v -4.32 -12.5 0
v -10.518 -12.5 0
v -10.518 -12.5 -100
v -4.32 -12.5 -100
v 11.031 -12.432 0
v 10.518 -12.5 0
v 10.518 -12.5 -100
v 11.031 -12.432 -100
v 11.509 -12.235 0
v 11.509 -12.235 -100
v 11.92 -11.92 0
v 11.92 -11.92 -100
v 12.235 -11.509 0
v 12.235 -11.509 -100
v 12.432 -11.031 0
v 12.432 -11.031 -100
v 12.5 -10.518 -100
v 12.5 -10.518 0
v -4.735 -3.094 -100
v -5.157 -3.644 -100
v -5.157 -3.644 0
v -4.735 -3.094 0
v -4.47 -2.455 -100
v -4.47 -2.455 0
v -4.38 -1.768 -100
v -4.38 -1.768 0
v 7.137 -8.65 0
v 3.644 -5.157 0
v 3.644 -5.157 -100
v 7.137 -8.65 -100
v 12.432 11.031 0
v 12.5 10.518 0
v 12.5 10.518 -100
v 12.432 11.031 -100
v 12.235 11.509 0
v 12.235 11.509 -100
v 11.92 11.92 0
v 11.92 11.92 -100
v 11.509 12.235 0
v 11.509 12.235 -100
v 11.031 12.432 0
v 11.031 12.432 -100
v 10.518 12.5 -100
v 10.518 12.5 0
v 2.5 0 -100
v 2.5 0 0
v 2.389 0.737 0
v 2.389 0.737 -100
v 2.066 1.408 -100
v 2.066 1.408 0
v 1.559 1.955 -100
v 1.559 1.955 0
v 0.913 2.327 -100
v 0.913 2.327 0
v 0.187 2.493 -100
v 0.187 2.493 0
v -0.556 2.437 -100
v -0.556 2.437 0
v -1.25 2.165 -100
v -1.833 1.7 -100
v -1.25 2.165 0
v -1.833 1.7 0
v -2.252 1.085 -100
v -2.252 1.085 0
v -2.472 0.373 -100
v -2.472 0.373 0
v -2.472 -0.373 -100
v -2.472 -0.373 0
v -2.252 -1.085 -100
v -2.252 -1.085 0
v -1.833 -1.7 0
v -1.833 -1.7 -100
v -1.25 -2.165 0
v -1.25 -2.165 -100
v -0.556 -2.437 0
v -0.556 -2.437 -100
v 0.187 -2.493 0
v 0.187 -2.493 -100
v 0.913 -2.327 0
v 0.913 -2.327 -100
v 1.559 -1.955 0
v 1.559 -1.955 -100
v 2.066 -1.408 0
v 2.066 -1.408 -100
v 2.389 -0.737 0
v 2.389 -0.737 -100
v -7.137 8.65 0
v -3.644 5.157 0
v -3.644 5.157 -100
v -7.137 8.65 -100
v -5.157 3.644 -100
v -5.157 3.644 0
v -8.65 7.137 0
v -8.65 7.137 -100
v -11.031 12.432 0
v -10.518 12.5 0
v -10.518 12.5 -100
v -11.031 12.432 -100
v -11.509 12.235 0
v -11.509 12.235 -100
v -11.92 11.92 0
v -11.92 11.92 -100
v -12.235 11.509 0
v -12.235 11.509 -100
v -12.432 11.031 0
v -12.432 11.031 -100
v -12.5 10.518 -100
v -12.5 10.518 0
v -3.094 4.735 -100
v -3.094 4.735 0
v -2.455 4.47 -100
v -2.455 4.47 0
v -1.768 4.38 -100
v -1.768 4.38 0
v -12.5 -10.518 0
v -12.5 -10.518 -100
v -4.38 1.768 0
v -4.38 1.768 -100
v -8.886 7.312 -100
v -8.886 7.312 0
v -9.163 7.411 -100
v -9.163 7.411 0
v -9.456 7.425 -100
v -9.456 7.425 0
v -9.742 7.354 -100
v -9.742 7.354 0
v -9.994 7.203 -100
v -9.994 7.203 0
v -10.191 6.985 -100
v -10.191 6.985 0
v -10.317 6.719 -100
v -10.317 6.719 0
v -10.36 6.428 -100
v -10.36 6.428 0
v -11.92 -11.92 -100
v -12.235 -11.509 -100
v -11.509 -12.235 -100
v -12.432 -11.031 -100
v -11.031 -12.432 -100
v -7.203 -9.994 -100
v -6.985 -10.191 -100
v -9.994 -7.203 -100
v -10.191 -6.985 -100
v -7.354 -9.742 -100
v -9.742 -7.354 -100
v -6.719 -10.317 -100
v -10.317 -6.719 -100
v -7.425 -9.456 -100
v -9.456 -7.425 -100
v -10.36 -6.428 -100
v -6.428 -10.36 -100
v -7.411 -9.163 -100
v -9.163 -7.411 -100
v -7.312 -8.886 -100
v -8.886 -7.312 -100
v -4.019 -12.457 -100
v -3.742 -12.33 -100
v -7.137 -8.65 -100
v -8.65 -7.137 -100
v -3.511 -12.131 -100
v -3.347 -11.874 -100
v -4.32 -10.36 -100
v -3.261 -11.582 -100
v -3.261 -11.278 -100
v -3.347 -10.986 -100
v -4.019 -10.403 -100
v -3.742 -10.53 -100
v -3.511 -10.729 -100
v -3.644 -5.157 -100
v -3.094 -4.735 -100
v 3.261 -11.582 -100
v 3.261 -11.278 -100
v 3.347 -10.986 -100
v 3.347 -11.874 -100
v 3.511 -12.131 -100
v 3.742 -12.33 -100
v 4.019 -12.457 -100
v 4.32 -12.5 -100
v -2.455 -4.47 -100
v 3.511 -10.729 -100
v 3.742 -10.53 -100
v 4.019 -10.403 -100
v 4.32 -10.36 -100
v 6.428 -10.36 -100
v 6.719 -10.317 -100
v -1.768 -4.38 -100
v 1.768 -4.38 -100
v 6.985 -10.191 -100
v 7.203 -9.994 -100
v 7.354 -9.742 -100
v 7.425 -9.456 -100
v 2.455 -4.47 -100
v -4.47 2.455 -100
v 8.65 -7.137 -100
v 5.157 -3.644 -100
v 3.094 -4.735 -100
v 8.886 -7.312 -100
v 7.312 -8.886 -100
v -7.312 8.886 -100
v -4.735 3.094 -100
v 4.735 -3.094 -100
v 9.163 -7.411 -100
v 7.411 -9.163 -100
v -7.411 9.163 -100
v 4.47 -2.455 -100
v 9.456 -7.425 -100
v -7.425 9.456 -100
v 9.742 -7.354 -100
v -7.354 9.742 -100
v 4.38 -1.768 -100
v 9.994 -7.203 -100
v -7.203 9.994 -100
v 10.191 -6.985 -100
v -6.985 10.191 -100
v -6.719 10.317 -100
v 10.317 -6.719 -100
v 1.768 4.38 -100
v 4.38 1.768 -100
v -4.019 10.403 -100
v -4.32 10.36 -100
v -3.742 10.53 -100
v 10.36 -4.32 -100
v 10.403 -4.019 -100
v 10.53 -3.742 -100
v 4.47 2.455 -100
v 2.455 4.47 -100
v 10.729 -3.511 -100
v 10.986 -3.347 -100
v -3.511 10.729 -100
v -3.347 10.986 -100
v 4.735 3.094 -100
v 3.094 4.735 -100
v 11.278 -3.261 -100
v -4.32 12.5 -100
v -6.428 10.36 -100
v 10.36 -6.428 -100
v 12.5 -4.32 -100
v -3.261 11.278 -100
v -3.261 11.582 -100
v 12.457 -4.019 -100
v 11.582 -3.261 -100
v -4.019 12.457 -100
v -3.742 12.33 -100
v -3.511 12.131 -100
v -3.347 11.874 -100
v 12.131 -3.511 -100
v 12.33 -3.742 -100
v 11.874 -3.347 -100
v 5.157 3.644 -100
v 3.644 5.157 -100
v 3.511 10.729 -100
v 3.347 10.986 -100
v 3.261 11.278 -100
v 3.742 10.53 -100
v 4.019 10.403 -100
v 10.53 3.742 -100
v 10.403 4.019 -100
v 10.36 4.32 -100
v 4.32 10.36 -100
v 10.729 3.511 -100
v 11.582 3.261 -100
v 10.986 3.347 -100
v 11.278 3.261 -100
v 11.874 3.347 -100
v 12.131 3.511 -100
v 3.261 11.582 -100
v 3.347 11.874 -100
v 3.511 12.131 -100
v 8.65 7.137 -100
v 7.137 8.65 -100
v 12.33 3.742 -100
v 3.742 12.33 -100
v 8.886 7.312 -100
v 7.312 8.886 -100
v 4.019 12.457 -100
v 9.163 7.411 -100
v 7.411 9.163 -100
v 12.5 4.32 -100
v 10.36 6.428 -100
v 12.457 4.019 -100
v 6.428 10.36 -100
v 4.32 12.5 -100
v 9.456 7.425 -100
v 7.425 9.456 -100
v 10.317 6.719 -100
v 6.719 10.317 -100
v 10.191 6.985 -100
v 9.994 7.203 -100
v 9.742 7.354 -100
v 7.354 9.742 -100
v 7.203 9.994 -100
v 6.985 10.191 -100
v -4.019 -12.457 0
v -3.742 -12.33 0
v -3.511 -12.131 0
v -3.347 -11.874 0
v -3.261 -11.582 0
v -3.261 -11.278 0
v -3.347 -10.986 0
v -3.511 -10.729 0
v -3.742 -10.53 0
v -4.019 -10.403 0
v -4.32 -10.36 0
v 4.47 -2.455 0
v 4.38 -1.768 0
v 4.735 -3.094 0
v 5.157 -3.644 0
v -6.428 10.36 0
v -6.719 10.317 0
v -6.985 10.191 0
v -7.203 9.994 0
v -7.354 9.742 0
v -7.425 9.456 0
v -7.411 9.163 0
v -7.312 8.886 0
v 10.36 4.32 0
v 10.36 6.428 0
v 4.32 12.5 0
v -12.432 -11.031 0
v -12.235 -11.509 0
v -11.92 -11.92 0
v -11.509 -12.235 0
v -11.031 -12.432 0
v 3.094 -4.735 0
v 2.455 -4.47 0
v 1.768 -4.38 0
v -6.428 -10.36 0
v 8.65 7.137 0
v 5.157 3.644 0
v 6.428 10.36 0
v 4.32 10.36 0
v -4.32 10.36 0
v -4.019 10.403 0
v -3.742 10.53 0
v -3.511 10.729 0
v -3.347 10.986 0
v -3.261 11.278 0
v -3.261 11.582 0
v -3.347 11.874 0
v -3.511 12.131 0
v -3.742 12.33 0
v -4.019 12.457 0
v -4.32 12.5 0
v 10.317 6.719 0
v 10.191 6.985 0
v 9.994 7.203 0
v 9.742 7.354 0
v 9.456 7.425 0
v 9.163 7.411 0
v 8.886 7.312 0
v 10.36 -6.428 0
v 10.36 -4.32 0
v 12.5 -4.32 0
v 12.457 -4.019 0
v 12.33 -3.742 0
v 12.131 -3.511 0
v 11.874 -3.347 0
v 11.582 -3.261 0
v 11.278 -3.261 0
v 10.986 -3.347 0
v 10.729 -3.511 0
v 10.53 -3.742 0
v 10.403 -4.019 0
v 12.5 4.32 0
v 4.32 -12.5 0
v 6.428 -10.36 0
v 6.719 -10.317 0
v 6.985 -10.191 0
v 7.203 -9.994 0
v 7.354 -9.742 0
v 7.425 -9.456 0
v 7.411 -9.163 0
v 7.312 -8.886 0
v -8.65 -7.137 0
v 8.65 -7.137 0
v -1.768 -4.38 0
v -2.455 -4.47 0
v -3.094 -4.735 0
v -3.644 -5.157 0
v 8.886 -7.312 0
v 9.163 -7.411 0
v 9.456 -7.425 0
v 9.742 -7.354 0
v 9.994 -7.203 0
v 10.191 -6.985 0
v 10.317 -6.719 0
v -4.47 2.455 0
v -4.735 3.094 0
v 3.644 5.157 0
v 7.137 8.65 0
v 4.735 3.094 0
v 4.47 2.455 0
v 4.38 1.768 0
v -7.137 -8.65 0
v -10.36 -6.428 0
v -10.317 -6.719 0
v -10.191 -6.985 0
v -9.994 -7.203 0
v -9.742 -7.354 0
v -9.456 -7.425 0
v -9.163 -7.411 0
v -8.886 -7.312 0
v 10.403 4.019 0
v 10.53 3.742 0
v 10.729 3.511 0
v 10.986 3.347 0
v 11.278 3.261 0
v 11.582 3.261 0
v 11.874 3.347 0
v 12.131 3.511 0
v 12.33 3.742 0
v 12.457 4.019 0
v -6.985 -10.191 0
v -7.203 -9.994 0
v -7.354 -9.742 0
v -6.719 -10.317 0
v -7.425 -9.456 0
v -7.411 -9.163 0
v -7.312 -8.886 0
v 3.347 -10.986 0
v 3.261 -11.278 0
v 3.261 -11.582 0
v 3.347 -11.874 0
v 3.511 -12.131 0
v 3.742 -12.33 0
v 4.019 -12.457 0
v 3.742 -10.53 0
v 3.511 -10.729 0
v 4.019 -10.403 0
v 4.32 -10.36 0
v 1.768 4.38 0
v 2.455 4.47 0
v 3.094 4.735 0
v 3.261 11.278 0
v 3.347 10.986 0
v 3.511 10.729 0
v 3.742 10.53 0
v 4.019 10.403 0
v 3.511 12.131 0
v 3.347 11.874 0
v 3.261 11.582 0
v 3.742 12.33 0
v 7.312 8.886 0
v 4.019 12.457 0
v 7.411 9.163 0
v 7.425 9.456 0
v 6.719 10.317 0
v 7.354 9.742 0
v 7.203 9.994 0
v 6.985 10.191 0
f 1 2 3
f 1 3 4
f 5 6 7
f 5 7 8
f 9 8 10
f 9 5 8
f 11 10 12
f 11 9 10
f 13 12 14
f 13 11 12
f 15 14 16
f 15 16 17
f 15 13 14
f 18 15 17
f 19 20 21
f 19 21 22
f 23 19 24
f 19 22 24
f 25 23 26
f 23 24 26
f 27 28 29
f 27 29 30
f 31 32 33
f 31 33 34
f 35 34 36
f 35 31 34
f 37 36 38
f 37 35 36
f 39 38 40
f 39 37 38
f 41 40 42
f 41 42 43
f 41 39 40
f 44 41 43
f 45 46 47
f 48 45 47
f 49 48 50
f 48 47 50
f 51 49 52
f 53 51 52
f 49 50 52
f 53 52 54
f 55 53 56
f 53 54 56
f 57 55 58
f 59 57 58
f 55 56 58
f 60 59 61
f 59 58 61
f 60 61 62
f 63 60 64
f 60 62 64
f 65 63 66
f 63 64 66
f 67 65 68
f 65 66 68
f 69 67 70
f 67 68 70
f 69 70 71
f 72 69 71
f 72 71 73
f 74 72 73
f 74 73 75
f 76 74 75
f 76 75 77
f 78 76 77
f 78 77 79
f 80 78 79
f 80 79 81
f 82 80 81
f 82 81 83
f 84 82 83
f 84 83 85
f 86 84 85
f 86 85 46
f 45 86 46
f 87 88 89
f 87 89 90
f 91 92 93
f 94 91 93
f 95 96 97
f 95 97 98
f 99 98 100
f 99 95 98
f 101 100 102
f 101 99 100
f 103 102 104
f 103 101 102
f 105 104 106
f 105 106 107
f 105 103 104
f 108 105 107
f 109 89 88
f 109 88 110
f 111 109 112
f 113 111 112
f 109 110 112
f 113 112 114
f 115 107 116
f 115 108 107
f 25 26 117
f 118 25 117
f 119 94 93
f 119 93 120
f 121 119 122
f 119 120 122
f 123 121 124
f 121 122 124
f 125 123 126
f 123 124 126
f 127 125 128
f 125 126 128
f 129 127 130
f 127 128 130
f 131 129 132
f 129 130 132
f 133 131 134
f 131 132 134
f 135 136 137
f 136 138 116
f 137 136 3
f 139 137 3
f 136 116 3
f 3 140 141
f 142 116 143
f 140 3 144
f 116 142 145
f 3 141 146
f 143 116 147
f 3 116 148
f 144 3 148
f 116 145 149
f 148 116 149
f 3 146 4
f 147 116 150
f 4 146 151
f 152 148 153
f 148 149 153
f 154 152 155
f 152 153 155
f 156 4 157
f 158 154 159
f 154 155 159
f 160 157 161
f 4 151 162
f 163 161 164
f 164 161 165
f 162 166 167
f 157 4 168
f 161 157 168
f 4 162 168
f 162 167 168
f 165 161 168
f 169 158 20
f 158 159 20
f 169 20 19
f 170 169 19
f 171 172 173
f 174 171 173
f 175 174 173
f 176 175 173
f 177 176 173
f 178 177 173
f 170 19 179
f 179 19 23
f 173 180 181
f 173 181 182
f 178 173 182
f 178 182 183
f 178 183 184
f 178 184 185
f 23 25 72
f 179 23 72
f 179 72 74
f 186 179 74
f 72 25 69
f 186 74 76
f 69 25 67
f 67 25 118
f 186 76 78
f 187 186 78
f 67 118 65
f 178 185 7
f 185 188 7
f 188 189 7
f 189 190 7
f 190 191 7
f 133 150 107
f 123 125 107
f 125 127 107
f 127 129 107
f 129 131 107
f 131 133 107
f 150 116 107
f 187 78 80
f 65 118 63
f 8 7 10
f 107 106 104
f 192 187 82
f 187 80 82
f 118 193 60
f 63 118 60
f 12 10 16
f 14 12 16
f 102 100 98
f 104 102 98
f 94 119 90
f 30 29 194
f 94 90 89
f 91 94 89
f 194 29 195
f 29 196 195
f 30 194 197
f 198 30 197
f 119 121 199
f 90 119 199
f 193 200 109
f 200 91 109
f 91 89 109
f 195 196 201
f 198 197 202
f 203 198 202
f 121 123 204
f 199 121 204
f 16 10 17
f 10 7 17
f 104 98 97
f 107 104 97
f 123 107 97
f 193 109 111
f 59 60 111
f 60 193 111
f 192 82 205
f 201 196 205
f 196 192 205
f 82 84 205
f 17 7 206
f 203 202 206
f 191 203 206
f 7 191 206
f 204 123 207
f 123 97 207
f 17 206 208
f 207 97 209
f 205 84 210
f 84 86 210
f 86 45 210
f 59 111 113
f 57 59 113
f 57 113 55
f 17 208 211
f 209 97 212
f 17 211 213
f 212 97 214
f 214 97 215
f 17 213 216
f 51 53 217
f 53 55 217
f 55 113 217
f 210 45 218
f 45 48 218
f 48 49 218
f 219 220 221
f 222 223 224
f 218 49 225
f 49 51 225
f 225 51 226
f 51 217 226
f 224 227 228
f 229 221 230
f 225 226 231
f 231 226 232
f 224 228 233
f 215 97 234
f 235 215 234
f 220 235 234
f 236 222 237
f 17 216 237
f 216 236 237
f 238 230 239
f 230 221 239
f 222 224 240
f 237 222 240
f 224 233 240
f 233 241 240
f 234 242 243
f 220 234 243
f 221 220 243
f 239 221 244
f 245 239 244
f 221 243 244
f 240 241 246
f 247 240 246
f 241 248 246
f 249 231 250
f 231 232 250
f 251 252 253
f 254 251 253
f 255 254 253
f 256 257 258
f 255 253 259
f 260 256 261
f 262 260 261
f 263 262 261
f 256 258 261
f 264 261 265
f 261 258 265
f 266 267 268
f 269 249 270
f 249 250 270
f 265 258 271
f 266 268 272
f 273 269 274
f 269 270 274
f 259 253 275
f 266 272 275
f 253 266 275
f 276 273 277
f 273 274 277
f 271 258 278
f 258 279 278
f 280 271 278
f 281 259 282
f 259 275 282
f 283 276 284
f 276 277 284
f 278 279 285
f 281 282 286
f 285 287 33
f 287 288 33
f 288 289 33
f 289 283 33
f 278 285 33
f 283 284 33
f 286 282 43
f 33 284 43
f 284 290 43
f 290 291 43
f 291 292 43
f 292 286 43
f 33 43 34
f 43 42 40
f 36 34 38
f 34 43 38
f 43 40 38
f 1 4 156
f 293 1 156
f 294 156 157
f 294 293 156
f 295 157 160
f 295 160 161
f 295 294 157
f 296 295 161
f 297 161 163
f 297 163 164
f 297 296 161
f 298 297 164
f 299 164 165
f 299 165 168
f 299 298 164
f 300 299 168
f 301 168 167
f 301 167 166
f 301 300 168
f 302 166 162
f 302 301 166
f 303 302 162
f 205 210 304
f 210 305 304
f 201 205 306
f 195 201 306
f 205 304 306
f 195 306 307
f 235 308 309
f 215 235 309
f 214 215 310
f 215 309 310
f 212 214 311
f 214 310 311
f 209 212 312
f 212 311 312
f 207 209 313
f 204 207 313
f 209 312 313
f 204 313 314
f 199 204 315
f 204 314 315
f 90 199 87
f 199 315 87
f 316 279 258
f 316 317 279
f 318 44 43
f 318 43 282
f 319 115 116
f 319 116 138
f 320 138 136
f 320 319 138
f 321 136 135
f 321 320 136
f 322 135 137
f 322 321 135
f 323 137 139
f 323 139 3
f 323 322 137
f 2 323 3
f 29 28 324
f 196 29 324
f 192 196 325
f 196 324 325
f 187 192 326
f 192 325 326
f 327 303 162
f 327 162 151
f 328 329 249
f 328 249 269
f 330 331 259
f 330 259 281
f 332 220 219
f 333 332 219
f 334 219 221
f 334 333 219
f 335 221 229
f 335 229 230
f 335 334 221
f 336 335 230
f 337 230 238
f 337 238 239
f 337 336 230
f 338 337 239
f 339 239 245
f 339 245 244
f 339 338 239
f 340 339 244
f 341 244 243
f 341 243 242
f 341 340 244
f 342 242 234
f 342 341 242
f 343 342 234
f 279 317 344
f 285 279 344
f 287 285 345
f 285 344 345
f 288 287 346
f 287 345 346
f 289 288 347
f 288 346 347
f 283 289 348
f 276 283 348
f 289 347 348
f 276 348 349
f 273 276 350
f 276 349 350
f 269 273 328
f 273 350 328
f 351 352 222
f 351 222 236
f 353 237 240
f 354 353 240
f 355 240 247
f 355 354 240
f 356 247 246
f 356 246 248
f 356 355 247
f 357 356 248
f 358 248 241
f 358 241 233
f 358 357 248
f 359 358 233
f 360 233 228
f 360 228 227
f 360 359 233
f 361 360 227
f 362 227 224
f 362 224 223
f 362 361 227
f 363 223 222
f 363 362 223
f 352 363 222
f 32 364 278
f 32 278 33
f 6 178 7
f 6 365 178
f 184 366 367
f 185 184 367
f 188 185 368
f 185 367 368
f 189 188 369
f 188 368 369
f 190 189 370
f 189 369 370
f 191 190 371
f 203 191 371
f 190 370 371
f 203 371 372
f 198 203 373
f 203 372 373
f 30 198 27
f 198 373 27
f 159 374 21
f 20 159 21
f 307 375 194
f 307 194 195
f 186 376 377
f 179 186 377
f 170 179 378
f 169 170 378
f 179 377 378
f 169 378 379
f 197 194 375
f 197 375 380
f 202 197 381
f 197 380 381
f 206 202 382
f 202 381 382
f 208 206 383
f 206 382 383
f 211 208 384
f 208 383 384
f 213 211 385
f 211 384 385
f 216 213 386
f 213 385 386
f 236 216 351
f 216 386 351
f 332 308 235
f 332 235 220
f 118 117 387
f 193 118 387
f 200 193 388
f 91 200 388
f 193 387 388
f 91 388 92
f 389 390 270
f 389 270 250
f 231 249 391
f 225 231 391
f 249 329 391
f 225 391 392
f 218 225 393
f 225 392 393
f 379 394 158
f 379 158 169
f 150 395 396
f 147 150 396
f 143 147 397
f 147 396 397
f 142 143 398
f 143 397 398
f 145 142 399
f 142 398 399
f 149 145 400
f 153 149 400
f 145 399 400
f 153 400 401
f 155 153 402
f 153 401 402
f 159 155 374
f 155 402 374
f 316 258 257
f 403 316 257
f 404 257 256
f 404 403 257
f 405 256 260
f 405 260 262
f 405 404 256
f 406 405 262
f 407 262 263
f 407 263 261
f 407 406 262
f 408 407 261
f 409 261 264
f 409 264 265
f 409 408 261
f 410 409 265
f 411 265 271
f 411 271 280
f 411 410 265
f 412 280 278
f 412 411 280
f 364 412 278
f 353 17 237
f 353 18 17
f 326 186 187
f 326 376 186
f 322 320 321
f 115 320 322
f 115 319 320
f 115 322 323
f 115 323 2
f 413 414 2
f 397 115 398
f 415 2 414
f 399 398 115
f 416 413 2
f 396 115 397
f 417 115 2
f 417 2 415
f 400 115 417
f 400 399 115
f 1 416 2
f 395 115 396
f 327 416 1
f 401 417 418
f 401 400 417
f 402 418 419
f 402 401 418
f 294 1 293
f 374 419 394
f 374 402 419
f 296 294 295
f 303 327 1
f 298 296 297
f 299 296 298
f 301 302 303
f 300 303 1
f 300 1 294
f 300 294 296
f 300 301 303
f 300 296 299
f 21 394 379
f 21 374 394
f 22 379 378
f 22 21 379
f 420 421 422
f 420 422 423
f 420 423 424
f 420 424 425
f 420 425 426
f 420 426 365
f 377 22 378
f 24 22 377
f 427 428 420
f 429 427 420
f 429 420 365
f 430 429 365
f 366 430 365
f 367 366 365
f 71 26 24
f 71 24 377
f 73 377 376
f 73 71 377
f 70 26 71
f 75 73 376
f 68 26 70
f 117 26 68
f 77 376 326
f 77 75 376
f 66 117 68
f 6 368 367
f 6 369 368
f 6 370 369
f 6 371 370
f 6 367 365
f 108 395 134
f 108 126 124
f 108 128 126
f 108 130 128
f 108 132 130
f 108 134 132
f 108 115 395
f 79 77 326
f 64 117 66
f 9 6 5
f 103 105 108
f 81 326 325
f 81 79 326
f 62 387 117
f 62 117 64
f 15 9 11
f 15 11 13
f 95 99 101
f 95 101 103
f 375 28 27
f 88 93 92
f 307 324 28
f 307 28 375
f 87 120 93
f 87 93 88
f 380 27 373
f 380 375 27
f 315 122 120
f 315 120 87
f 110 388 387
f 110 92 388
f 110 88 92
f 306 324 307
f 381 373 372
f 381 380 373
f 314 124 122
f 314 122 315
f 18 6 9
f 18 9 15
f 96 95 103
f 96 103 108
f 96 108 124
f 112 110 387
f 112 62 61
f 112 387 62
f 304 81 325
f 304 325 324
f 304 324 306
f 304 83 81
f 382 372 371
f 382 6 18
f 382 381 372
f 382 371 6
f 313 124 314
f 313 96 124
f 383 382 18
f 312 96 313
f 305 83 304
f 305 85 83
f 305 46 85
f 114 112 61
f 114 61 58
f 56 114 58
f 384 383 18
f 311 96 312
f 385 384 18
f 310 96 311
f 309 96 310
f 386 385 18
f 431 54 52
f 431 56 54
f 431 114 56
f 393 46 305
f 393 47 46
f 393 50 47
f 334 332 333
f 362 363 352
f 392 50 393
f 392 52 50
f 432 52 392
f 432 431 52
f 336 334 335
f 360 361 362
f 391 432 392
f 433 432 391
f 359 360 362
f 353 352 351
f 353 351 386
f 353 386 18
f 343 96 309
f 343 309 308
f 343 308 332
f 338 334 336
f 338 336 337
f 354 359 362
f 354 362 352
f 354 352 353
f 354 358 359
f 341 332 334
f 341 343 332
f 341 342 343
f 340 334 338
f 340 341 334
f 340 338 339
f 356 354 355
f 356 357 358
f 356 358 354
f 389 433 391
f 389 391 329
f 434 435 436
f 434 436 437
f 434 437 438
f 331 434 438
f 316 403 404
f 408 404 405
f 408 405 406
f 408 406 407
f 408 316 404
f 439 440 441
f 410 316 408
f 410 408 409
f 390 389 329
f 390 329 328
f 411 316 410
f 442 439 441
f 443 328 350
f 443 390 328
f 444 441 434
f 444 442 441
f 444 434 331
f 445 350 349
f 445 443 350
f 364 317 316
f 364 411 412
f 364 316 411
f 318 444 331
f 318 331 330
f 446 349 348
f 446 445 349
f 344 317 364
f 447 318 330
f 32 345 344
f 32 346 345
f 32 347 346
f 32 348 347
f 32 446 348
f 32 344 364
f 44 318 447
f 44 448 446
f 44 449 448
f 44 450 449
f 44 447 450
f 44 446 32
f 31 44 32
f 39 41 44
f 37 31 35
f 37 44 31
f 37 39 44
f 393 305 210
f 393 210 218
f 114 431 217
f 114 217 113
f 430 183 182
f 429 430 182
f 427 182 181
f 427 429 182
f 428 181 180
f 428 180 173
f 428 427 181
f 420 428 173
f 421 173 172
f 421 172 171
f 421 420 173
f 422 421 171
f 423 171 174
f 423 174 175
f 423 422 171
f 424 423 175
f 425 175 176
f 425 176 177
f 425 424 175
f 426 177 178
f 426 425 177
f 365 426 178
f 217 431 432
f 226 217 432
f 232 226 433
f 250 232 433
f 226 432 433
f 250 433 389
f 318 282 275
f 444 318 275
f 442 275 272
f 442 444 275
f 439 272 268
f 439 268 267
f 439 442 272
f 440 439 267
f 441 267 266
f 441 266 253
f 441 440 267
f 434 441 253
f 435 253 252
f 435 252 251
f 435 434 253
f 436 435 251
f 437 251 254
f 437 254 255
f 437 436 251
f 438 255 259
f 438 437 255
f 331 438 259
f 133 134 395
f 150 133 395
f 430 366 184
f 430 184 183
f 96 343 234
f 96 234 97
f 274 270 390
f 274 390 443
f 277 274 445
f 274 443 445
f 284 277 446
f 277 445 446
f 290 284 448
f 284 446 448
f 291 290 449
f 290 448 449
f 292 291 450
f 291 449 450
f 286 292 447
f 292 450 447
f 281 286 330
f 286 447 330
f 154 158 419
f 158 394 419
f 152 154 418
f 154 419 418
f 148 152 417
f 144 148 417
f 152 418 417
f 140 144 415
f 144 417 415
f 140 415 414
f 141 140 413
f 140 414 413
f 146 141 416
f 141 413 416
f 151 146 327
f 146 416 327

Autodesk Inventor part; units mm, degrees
ref_plane "YZ Plane" through (0, 0, 0) normal (1, 0, 0) x (0, 1, 0)
ref_plane "XZ Plane" through (0, 0, 0) normal (0, 1, 0) x (-1, 0, 0)
ref_plane "XY Plane" through (0, 0, 0) normal (0, 0, 1) x (1, 0, 0)
sketch "Sketch1" plane through (0, 0, 0) normal (0, 0, 1) x (1, 0, 0)
  arc A0 (-10.36, -6.4282) -> (-8.6498, -7.1366) centre (-9.3582, -6.4282) ccw
  line L0 (-10.36, 6.4282) -> (-10.36, -6.4282)
  arc A1 (-8.6498, 7.1366) -> (-10.36, 6.4282) centre (-9.3582, 6.4282) ccw
  line L1 (-5.1567, 3.6435) -> (-8.6498, 7.1366)
  arc A2 (-4.38, 1.7684) -> (-5.1567, 3.6435) centre (-7.0317, 1.7684) ccw
  line L2 (-4.38, -1.7684) -> (-4.38, 1.7684)
  arc A3 (-5.1567, -3.6435) -> (-4.38, -1.7684) centre (-7.0317, -1.7684) ccw
  line L3 (-8.6498, -7.1366) -> (-5.1567, -3.6435)
  circle A4 centre (0, 0) radius 2.5
  line L4 (-10.5183, -12.5) -> (-4.32, -12.5)
  arc A5 (-4.32, -12.5) -> (-4.32, -10.36) centre (-4.32, -11.43) ccw
  line L5 (-4.32, -10.36) -> (-6.4282, -10.36)
  arc A6 (-7.1366, -8.6498) -> (-6.4282, -10.36) centre (-6.4282, -9.3582) ccw
  line L6 (-7.1366, -8.6498) -> (-3.6435, -5.1567)
  arc A7 (-1.7684, -4.38) -> (-3.6435, -5.1567) centre (-1.7684, -7.0317) ccw
  line L7 (-1.7684, -4.38) -> (1.7684, -4.38)
  arc A8 (3.6435, -5.1567) -> (1.7684, -4.38) centre (1.7684, -7.0317) ccw
  line L8 (3.6435, -5.1567) -> (7.1366, -8.6498)
  arc A9 (6.4282, -10.36) -> (7.1366, -8.6498) centre (6.4282, -9.3582) ccw
  line L9 (6.4282, -10.36) -> (4.32, -10.36)
  arc A10 (4.32, -10.36) -> (4.32, -12.5) centre (4.32, -11.43) ccw
  line L10 (4.32, -12.5) -> (10.5183, -12.5)
  arc A11 (10.5183, -12.5) -> (12.5, -10.5183) centre (10.5183, -10.5183) ccw
  line L11 (12.5, -10.5183) -> (12.5, -4.32)
  arc A12 (12.5, -4.32) -> (10.36, -4.32) centre (11.43, -4.32) ccw
  line L12 (10.36, -4.32) -> (10.36, -6.4282)
  arc A13 (8.6498, -7.1366) -> (10.36, -6.4282) centre (9.3582, -6.4282) ccw
  line L13 (8.6498, -7.1366) -> (5.1567, -3.6435)
  arc A14 (4.38, -1.7684) -> (5.1567, -3.6435) centre (7.0317, -1.7684) ccw
  line L14 (4.38, -1.7684) -> (4.38, 1.7684)
  arc A15 (5.1567, 3.6435) -> (4.38, 1.7684) centre (7.0317, 1.7684) ccw
  line L15 (5.1567, 3.6435) -> (8.6498, 7.1366)
  arc A16 (10.36, 6.4282) -> (8.6498, 7.1366) centre (9.3582, 6.4282) ccw
  line L16 (10.36, 6.4282) -> (10.36, 4.32)
  arc A17 (10.36, 4.32) -> (12.5, 4.32) centre (11.43, 4.32) ccw
  line L17 (12.5, 4.32) -> (12.5, 10.5183)
  arc A18 (12.5, 10.5183) -> (10.5183, 12.5) centre (10.5183, 10.5183) ccw
  line L18 (10.5183, 12.5) -> (4.32, 12.5)
  arc A19 (4.32, 12.5) -> (4.32, 10.36) centre (4.32, 11.43) ccw
  line L19 (4.32, 10.36) -> (6.4282, 10.36)
  arc A20 (7.1366, 8.6498) -> (6.4282, 10.36) centre (6.4282, 9.3582) ccw
  line L20 (7.1366, 8.6498) -> (3.6435, 5.1567)
  arc A21 (1.7684, 4.38) -> (3.6435, 5.1567) centre (1.7684, 7.0317) ccw
  line L21 (1.7684, 4.38) -> (-1.7684, 4.38)
  arc A22 (-3.6435, 5.1567) -> (-1.7684, 4.38) centre (-1.7684, 7.0317) ccw
  line L22 (-3.6435, 5.1567) -> (-7.1366, 8.6498)
  arc A23 (-6.4282, 10.36) -> (-7.1366, 8.6498) centre (-6.4282, 9.3582) ccw
  line L23 (-6.4282, 10.36) -> (-4.32, 10.36)
  arc A24 (-4.32, 10.36) -> (-4.32, 12.5) centre (-4.32, 11.43) ccw
  line L24 (-4.32, 12.5) -> (-10.5183, 12.5)
  arc A25 (-10.5183, 12.5) -> (-12.5, 10.5183) centre (-10.5183, 10.5183) ccw
  line L25 (-12.5, 10.5183) -> (-12.5, -10.5183)
  arc A26 (-12.5, -10.5183) -> (-10.5183, -12.5) centre (-10.5183, -10.5183) ccw
extrude "Extrusion1" add sketch "Sketch1" against normal blind 100
properties part number "25-2503"
